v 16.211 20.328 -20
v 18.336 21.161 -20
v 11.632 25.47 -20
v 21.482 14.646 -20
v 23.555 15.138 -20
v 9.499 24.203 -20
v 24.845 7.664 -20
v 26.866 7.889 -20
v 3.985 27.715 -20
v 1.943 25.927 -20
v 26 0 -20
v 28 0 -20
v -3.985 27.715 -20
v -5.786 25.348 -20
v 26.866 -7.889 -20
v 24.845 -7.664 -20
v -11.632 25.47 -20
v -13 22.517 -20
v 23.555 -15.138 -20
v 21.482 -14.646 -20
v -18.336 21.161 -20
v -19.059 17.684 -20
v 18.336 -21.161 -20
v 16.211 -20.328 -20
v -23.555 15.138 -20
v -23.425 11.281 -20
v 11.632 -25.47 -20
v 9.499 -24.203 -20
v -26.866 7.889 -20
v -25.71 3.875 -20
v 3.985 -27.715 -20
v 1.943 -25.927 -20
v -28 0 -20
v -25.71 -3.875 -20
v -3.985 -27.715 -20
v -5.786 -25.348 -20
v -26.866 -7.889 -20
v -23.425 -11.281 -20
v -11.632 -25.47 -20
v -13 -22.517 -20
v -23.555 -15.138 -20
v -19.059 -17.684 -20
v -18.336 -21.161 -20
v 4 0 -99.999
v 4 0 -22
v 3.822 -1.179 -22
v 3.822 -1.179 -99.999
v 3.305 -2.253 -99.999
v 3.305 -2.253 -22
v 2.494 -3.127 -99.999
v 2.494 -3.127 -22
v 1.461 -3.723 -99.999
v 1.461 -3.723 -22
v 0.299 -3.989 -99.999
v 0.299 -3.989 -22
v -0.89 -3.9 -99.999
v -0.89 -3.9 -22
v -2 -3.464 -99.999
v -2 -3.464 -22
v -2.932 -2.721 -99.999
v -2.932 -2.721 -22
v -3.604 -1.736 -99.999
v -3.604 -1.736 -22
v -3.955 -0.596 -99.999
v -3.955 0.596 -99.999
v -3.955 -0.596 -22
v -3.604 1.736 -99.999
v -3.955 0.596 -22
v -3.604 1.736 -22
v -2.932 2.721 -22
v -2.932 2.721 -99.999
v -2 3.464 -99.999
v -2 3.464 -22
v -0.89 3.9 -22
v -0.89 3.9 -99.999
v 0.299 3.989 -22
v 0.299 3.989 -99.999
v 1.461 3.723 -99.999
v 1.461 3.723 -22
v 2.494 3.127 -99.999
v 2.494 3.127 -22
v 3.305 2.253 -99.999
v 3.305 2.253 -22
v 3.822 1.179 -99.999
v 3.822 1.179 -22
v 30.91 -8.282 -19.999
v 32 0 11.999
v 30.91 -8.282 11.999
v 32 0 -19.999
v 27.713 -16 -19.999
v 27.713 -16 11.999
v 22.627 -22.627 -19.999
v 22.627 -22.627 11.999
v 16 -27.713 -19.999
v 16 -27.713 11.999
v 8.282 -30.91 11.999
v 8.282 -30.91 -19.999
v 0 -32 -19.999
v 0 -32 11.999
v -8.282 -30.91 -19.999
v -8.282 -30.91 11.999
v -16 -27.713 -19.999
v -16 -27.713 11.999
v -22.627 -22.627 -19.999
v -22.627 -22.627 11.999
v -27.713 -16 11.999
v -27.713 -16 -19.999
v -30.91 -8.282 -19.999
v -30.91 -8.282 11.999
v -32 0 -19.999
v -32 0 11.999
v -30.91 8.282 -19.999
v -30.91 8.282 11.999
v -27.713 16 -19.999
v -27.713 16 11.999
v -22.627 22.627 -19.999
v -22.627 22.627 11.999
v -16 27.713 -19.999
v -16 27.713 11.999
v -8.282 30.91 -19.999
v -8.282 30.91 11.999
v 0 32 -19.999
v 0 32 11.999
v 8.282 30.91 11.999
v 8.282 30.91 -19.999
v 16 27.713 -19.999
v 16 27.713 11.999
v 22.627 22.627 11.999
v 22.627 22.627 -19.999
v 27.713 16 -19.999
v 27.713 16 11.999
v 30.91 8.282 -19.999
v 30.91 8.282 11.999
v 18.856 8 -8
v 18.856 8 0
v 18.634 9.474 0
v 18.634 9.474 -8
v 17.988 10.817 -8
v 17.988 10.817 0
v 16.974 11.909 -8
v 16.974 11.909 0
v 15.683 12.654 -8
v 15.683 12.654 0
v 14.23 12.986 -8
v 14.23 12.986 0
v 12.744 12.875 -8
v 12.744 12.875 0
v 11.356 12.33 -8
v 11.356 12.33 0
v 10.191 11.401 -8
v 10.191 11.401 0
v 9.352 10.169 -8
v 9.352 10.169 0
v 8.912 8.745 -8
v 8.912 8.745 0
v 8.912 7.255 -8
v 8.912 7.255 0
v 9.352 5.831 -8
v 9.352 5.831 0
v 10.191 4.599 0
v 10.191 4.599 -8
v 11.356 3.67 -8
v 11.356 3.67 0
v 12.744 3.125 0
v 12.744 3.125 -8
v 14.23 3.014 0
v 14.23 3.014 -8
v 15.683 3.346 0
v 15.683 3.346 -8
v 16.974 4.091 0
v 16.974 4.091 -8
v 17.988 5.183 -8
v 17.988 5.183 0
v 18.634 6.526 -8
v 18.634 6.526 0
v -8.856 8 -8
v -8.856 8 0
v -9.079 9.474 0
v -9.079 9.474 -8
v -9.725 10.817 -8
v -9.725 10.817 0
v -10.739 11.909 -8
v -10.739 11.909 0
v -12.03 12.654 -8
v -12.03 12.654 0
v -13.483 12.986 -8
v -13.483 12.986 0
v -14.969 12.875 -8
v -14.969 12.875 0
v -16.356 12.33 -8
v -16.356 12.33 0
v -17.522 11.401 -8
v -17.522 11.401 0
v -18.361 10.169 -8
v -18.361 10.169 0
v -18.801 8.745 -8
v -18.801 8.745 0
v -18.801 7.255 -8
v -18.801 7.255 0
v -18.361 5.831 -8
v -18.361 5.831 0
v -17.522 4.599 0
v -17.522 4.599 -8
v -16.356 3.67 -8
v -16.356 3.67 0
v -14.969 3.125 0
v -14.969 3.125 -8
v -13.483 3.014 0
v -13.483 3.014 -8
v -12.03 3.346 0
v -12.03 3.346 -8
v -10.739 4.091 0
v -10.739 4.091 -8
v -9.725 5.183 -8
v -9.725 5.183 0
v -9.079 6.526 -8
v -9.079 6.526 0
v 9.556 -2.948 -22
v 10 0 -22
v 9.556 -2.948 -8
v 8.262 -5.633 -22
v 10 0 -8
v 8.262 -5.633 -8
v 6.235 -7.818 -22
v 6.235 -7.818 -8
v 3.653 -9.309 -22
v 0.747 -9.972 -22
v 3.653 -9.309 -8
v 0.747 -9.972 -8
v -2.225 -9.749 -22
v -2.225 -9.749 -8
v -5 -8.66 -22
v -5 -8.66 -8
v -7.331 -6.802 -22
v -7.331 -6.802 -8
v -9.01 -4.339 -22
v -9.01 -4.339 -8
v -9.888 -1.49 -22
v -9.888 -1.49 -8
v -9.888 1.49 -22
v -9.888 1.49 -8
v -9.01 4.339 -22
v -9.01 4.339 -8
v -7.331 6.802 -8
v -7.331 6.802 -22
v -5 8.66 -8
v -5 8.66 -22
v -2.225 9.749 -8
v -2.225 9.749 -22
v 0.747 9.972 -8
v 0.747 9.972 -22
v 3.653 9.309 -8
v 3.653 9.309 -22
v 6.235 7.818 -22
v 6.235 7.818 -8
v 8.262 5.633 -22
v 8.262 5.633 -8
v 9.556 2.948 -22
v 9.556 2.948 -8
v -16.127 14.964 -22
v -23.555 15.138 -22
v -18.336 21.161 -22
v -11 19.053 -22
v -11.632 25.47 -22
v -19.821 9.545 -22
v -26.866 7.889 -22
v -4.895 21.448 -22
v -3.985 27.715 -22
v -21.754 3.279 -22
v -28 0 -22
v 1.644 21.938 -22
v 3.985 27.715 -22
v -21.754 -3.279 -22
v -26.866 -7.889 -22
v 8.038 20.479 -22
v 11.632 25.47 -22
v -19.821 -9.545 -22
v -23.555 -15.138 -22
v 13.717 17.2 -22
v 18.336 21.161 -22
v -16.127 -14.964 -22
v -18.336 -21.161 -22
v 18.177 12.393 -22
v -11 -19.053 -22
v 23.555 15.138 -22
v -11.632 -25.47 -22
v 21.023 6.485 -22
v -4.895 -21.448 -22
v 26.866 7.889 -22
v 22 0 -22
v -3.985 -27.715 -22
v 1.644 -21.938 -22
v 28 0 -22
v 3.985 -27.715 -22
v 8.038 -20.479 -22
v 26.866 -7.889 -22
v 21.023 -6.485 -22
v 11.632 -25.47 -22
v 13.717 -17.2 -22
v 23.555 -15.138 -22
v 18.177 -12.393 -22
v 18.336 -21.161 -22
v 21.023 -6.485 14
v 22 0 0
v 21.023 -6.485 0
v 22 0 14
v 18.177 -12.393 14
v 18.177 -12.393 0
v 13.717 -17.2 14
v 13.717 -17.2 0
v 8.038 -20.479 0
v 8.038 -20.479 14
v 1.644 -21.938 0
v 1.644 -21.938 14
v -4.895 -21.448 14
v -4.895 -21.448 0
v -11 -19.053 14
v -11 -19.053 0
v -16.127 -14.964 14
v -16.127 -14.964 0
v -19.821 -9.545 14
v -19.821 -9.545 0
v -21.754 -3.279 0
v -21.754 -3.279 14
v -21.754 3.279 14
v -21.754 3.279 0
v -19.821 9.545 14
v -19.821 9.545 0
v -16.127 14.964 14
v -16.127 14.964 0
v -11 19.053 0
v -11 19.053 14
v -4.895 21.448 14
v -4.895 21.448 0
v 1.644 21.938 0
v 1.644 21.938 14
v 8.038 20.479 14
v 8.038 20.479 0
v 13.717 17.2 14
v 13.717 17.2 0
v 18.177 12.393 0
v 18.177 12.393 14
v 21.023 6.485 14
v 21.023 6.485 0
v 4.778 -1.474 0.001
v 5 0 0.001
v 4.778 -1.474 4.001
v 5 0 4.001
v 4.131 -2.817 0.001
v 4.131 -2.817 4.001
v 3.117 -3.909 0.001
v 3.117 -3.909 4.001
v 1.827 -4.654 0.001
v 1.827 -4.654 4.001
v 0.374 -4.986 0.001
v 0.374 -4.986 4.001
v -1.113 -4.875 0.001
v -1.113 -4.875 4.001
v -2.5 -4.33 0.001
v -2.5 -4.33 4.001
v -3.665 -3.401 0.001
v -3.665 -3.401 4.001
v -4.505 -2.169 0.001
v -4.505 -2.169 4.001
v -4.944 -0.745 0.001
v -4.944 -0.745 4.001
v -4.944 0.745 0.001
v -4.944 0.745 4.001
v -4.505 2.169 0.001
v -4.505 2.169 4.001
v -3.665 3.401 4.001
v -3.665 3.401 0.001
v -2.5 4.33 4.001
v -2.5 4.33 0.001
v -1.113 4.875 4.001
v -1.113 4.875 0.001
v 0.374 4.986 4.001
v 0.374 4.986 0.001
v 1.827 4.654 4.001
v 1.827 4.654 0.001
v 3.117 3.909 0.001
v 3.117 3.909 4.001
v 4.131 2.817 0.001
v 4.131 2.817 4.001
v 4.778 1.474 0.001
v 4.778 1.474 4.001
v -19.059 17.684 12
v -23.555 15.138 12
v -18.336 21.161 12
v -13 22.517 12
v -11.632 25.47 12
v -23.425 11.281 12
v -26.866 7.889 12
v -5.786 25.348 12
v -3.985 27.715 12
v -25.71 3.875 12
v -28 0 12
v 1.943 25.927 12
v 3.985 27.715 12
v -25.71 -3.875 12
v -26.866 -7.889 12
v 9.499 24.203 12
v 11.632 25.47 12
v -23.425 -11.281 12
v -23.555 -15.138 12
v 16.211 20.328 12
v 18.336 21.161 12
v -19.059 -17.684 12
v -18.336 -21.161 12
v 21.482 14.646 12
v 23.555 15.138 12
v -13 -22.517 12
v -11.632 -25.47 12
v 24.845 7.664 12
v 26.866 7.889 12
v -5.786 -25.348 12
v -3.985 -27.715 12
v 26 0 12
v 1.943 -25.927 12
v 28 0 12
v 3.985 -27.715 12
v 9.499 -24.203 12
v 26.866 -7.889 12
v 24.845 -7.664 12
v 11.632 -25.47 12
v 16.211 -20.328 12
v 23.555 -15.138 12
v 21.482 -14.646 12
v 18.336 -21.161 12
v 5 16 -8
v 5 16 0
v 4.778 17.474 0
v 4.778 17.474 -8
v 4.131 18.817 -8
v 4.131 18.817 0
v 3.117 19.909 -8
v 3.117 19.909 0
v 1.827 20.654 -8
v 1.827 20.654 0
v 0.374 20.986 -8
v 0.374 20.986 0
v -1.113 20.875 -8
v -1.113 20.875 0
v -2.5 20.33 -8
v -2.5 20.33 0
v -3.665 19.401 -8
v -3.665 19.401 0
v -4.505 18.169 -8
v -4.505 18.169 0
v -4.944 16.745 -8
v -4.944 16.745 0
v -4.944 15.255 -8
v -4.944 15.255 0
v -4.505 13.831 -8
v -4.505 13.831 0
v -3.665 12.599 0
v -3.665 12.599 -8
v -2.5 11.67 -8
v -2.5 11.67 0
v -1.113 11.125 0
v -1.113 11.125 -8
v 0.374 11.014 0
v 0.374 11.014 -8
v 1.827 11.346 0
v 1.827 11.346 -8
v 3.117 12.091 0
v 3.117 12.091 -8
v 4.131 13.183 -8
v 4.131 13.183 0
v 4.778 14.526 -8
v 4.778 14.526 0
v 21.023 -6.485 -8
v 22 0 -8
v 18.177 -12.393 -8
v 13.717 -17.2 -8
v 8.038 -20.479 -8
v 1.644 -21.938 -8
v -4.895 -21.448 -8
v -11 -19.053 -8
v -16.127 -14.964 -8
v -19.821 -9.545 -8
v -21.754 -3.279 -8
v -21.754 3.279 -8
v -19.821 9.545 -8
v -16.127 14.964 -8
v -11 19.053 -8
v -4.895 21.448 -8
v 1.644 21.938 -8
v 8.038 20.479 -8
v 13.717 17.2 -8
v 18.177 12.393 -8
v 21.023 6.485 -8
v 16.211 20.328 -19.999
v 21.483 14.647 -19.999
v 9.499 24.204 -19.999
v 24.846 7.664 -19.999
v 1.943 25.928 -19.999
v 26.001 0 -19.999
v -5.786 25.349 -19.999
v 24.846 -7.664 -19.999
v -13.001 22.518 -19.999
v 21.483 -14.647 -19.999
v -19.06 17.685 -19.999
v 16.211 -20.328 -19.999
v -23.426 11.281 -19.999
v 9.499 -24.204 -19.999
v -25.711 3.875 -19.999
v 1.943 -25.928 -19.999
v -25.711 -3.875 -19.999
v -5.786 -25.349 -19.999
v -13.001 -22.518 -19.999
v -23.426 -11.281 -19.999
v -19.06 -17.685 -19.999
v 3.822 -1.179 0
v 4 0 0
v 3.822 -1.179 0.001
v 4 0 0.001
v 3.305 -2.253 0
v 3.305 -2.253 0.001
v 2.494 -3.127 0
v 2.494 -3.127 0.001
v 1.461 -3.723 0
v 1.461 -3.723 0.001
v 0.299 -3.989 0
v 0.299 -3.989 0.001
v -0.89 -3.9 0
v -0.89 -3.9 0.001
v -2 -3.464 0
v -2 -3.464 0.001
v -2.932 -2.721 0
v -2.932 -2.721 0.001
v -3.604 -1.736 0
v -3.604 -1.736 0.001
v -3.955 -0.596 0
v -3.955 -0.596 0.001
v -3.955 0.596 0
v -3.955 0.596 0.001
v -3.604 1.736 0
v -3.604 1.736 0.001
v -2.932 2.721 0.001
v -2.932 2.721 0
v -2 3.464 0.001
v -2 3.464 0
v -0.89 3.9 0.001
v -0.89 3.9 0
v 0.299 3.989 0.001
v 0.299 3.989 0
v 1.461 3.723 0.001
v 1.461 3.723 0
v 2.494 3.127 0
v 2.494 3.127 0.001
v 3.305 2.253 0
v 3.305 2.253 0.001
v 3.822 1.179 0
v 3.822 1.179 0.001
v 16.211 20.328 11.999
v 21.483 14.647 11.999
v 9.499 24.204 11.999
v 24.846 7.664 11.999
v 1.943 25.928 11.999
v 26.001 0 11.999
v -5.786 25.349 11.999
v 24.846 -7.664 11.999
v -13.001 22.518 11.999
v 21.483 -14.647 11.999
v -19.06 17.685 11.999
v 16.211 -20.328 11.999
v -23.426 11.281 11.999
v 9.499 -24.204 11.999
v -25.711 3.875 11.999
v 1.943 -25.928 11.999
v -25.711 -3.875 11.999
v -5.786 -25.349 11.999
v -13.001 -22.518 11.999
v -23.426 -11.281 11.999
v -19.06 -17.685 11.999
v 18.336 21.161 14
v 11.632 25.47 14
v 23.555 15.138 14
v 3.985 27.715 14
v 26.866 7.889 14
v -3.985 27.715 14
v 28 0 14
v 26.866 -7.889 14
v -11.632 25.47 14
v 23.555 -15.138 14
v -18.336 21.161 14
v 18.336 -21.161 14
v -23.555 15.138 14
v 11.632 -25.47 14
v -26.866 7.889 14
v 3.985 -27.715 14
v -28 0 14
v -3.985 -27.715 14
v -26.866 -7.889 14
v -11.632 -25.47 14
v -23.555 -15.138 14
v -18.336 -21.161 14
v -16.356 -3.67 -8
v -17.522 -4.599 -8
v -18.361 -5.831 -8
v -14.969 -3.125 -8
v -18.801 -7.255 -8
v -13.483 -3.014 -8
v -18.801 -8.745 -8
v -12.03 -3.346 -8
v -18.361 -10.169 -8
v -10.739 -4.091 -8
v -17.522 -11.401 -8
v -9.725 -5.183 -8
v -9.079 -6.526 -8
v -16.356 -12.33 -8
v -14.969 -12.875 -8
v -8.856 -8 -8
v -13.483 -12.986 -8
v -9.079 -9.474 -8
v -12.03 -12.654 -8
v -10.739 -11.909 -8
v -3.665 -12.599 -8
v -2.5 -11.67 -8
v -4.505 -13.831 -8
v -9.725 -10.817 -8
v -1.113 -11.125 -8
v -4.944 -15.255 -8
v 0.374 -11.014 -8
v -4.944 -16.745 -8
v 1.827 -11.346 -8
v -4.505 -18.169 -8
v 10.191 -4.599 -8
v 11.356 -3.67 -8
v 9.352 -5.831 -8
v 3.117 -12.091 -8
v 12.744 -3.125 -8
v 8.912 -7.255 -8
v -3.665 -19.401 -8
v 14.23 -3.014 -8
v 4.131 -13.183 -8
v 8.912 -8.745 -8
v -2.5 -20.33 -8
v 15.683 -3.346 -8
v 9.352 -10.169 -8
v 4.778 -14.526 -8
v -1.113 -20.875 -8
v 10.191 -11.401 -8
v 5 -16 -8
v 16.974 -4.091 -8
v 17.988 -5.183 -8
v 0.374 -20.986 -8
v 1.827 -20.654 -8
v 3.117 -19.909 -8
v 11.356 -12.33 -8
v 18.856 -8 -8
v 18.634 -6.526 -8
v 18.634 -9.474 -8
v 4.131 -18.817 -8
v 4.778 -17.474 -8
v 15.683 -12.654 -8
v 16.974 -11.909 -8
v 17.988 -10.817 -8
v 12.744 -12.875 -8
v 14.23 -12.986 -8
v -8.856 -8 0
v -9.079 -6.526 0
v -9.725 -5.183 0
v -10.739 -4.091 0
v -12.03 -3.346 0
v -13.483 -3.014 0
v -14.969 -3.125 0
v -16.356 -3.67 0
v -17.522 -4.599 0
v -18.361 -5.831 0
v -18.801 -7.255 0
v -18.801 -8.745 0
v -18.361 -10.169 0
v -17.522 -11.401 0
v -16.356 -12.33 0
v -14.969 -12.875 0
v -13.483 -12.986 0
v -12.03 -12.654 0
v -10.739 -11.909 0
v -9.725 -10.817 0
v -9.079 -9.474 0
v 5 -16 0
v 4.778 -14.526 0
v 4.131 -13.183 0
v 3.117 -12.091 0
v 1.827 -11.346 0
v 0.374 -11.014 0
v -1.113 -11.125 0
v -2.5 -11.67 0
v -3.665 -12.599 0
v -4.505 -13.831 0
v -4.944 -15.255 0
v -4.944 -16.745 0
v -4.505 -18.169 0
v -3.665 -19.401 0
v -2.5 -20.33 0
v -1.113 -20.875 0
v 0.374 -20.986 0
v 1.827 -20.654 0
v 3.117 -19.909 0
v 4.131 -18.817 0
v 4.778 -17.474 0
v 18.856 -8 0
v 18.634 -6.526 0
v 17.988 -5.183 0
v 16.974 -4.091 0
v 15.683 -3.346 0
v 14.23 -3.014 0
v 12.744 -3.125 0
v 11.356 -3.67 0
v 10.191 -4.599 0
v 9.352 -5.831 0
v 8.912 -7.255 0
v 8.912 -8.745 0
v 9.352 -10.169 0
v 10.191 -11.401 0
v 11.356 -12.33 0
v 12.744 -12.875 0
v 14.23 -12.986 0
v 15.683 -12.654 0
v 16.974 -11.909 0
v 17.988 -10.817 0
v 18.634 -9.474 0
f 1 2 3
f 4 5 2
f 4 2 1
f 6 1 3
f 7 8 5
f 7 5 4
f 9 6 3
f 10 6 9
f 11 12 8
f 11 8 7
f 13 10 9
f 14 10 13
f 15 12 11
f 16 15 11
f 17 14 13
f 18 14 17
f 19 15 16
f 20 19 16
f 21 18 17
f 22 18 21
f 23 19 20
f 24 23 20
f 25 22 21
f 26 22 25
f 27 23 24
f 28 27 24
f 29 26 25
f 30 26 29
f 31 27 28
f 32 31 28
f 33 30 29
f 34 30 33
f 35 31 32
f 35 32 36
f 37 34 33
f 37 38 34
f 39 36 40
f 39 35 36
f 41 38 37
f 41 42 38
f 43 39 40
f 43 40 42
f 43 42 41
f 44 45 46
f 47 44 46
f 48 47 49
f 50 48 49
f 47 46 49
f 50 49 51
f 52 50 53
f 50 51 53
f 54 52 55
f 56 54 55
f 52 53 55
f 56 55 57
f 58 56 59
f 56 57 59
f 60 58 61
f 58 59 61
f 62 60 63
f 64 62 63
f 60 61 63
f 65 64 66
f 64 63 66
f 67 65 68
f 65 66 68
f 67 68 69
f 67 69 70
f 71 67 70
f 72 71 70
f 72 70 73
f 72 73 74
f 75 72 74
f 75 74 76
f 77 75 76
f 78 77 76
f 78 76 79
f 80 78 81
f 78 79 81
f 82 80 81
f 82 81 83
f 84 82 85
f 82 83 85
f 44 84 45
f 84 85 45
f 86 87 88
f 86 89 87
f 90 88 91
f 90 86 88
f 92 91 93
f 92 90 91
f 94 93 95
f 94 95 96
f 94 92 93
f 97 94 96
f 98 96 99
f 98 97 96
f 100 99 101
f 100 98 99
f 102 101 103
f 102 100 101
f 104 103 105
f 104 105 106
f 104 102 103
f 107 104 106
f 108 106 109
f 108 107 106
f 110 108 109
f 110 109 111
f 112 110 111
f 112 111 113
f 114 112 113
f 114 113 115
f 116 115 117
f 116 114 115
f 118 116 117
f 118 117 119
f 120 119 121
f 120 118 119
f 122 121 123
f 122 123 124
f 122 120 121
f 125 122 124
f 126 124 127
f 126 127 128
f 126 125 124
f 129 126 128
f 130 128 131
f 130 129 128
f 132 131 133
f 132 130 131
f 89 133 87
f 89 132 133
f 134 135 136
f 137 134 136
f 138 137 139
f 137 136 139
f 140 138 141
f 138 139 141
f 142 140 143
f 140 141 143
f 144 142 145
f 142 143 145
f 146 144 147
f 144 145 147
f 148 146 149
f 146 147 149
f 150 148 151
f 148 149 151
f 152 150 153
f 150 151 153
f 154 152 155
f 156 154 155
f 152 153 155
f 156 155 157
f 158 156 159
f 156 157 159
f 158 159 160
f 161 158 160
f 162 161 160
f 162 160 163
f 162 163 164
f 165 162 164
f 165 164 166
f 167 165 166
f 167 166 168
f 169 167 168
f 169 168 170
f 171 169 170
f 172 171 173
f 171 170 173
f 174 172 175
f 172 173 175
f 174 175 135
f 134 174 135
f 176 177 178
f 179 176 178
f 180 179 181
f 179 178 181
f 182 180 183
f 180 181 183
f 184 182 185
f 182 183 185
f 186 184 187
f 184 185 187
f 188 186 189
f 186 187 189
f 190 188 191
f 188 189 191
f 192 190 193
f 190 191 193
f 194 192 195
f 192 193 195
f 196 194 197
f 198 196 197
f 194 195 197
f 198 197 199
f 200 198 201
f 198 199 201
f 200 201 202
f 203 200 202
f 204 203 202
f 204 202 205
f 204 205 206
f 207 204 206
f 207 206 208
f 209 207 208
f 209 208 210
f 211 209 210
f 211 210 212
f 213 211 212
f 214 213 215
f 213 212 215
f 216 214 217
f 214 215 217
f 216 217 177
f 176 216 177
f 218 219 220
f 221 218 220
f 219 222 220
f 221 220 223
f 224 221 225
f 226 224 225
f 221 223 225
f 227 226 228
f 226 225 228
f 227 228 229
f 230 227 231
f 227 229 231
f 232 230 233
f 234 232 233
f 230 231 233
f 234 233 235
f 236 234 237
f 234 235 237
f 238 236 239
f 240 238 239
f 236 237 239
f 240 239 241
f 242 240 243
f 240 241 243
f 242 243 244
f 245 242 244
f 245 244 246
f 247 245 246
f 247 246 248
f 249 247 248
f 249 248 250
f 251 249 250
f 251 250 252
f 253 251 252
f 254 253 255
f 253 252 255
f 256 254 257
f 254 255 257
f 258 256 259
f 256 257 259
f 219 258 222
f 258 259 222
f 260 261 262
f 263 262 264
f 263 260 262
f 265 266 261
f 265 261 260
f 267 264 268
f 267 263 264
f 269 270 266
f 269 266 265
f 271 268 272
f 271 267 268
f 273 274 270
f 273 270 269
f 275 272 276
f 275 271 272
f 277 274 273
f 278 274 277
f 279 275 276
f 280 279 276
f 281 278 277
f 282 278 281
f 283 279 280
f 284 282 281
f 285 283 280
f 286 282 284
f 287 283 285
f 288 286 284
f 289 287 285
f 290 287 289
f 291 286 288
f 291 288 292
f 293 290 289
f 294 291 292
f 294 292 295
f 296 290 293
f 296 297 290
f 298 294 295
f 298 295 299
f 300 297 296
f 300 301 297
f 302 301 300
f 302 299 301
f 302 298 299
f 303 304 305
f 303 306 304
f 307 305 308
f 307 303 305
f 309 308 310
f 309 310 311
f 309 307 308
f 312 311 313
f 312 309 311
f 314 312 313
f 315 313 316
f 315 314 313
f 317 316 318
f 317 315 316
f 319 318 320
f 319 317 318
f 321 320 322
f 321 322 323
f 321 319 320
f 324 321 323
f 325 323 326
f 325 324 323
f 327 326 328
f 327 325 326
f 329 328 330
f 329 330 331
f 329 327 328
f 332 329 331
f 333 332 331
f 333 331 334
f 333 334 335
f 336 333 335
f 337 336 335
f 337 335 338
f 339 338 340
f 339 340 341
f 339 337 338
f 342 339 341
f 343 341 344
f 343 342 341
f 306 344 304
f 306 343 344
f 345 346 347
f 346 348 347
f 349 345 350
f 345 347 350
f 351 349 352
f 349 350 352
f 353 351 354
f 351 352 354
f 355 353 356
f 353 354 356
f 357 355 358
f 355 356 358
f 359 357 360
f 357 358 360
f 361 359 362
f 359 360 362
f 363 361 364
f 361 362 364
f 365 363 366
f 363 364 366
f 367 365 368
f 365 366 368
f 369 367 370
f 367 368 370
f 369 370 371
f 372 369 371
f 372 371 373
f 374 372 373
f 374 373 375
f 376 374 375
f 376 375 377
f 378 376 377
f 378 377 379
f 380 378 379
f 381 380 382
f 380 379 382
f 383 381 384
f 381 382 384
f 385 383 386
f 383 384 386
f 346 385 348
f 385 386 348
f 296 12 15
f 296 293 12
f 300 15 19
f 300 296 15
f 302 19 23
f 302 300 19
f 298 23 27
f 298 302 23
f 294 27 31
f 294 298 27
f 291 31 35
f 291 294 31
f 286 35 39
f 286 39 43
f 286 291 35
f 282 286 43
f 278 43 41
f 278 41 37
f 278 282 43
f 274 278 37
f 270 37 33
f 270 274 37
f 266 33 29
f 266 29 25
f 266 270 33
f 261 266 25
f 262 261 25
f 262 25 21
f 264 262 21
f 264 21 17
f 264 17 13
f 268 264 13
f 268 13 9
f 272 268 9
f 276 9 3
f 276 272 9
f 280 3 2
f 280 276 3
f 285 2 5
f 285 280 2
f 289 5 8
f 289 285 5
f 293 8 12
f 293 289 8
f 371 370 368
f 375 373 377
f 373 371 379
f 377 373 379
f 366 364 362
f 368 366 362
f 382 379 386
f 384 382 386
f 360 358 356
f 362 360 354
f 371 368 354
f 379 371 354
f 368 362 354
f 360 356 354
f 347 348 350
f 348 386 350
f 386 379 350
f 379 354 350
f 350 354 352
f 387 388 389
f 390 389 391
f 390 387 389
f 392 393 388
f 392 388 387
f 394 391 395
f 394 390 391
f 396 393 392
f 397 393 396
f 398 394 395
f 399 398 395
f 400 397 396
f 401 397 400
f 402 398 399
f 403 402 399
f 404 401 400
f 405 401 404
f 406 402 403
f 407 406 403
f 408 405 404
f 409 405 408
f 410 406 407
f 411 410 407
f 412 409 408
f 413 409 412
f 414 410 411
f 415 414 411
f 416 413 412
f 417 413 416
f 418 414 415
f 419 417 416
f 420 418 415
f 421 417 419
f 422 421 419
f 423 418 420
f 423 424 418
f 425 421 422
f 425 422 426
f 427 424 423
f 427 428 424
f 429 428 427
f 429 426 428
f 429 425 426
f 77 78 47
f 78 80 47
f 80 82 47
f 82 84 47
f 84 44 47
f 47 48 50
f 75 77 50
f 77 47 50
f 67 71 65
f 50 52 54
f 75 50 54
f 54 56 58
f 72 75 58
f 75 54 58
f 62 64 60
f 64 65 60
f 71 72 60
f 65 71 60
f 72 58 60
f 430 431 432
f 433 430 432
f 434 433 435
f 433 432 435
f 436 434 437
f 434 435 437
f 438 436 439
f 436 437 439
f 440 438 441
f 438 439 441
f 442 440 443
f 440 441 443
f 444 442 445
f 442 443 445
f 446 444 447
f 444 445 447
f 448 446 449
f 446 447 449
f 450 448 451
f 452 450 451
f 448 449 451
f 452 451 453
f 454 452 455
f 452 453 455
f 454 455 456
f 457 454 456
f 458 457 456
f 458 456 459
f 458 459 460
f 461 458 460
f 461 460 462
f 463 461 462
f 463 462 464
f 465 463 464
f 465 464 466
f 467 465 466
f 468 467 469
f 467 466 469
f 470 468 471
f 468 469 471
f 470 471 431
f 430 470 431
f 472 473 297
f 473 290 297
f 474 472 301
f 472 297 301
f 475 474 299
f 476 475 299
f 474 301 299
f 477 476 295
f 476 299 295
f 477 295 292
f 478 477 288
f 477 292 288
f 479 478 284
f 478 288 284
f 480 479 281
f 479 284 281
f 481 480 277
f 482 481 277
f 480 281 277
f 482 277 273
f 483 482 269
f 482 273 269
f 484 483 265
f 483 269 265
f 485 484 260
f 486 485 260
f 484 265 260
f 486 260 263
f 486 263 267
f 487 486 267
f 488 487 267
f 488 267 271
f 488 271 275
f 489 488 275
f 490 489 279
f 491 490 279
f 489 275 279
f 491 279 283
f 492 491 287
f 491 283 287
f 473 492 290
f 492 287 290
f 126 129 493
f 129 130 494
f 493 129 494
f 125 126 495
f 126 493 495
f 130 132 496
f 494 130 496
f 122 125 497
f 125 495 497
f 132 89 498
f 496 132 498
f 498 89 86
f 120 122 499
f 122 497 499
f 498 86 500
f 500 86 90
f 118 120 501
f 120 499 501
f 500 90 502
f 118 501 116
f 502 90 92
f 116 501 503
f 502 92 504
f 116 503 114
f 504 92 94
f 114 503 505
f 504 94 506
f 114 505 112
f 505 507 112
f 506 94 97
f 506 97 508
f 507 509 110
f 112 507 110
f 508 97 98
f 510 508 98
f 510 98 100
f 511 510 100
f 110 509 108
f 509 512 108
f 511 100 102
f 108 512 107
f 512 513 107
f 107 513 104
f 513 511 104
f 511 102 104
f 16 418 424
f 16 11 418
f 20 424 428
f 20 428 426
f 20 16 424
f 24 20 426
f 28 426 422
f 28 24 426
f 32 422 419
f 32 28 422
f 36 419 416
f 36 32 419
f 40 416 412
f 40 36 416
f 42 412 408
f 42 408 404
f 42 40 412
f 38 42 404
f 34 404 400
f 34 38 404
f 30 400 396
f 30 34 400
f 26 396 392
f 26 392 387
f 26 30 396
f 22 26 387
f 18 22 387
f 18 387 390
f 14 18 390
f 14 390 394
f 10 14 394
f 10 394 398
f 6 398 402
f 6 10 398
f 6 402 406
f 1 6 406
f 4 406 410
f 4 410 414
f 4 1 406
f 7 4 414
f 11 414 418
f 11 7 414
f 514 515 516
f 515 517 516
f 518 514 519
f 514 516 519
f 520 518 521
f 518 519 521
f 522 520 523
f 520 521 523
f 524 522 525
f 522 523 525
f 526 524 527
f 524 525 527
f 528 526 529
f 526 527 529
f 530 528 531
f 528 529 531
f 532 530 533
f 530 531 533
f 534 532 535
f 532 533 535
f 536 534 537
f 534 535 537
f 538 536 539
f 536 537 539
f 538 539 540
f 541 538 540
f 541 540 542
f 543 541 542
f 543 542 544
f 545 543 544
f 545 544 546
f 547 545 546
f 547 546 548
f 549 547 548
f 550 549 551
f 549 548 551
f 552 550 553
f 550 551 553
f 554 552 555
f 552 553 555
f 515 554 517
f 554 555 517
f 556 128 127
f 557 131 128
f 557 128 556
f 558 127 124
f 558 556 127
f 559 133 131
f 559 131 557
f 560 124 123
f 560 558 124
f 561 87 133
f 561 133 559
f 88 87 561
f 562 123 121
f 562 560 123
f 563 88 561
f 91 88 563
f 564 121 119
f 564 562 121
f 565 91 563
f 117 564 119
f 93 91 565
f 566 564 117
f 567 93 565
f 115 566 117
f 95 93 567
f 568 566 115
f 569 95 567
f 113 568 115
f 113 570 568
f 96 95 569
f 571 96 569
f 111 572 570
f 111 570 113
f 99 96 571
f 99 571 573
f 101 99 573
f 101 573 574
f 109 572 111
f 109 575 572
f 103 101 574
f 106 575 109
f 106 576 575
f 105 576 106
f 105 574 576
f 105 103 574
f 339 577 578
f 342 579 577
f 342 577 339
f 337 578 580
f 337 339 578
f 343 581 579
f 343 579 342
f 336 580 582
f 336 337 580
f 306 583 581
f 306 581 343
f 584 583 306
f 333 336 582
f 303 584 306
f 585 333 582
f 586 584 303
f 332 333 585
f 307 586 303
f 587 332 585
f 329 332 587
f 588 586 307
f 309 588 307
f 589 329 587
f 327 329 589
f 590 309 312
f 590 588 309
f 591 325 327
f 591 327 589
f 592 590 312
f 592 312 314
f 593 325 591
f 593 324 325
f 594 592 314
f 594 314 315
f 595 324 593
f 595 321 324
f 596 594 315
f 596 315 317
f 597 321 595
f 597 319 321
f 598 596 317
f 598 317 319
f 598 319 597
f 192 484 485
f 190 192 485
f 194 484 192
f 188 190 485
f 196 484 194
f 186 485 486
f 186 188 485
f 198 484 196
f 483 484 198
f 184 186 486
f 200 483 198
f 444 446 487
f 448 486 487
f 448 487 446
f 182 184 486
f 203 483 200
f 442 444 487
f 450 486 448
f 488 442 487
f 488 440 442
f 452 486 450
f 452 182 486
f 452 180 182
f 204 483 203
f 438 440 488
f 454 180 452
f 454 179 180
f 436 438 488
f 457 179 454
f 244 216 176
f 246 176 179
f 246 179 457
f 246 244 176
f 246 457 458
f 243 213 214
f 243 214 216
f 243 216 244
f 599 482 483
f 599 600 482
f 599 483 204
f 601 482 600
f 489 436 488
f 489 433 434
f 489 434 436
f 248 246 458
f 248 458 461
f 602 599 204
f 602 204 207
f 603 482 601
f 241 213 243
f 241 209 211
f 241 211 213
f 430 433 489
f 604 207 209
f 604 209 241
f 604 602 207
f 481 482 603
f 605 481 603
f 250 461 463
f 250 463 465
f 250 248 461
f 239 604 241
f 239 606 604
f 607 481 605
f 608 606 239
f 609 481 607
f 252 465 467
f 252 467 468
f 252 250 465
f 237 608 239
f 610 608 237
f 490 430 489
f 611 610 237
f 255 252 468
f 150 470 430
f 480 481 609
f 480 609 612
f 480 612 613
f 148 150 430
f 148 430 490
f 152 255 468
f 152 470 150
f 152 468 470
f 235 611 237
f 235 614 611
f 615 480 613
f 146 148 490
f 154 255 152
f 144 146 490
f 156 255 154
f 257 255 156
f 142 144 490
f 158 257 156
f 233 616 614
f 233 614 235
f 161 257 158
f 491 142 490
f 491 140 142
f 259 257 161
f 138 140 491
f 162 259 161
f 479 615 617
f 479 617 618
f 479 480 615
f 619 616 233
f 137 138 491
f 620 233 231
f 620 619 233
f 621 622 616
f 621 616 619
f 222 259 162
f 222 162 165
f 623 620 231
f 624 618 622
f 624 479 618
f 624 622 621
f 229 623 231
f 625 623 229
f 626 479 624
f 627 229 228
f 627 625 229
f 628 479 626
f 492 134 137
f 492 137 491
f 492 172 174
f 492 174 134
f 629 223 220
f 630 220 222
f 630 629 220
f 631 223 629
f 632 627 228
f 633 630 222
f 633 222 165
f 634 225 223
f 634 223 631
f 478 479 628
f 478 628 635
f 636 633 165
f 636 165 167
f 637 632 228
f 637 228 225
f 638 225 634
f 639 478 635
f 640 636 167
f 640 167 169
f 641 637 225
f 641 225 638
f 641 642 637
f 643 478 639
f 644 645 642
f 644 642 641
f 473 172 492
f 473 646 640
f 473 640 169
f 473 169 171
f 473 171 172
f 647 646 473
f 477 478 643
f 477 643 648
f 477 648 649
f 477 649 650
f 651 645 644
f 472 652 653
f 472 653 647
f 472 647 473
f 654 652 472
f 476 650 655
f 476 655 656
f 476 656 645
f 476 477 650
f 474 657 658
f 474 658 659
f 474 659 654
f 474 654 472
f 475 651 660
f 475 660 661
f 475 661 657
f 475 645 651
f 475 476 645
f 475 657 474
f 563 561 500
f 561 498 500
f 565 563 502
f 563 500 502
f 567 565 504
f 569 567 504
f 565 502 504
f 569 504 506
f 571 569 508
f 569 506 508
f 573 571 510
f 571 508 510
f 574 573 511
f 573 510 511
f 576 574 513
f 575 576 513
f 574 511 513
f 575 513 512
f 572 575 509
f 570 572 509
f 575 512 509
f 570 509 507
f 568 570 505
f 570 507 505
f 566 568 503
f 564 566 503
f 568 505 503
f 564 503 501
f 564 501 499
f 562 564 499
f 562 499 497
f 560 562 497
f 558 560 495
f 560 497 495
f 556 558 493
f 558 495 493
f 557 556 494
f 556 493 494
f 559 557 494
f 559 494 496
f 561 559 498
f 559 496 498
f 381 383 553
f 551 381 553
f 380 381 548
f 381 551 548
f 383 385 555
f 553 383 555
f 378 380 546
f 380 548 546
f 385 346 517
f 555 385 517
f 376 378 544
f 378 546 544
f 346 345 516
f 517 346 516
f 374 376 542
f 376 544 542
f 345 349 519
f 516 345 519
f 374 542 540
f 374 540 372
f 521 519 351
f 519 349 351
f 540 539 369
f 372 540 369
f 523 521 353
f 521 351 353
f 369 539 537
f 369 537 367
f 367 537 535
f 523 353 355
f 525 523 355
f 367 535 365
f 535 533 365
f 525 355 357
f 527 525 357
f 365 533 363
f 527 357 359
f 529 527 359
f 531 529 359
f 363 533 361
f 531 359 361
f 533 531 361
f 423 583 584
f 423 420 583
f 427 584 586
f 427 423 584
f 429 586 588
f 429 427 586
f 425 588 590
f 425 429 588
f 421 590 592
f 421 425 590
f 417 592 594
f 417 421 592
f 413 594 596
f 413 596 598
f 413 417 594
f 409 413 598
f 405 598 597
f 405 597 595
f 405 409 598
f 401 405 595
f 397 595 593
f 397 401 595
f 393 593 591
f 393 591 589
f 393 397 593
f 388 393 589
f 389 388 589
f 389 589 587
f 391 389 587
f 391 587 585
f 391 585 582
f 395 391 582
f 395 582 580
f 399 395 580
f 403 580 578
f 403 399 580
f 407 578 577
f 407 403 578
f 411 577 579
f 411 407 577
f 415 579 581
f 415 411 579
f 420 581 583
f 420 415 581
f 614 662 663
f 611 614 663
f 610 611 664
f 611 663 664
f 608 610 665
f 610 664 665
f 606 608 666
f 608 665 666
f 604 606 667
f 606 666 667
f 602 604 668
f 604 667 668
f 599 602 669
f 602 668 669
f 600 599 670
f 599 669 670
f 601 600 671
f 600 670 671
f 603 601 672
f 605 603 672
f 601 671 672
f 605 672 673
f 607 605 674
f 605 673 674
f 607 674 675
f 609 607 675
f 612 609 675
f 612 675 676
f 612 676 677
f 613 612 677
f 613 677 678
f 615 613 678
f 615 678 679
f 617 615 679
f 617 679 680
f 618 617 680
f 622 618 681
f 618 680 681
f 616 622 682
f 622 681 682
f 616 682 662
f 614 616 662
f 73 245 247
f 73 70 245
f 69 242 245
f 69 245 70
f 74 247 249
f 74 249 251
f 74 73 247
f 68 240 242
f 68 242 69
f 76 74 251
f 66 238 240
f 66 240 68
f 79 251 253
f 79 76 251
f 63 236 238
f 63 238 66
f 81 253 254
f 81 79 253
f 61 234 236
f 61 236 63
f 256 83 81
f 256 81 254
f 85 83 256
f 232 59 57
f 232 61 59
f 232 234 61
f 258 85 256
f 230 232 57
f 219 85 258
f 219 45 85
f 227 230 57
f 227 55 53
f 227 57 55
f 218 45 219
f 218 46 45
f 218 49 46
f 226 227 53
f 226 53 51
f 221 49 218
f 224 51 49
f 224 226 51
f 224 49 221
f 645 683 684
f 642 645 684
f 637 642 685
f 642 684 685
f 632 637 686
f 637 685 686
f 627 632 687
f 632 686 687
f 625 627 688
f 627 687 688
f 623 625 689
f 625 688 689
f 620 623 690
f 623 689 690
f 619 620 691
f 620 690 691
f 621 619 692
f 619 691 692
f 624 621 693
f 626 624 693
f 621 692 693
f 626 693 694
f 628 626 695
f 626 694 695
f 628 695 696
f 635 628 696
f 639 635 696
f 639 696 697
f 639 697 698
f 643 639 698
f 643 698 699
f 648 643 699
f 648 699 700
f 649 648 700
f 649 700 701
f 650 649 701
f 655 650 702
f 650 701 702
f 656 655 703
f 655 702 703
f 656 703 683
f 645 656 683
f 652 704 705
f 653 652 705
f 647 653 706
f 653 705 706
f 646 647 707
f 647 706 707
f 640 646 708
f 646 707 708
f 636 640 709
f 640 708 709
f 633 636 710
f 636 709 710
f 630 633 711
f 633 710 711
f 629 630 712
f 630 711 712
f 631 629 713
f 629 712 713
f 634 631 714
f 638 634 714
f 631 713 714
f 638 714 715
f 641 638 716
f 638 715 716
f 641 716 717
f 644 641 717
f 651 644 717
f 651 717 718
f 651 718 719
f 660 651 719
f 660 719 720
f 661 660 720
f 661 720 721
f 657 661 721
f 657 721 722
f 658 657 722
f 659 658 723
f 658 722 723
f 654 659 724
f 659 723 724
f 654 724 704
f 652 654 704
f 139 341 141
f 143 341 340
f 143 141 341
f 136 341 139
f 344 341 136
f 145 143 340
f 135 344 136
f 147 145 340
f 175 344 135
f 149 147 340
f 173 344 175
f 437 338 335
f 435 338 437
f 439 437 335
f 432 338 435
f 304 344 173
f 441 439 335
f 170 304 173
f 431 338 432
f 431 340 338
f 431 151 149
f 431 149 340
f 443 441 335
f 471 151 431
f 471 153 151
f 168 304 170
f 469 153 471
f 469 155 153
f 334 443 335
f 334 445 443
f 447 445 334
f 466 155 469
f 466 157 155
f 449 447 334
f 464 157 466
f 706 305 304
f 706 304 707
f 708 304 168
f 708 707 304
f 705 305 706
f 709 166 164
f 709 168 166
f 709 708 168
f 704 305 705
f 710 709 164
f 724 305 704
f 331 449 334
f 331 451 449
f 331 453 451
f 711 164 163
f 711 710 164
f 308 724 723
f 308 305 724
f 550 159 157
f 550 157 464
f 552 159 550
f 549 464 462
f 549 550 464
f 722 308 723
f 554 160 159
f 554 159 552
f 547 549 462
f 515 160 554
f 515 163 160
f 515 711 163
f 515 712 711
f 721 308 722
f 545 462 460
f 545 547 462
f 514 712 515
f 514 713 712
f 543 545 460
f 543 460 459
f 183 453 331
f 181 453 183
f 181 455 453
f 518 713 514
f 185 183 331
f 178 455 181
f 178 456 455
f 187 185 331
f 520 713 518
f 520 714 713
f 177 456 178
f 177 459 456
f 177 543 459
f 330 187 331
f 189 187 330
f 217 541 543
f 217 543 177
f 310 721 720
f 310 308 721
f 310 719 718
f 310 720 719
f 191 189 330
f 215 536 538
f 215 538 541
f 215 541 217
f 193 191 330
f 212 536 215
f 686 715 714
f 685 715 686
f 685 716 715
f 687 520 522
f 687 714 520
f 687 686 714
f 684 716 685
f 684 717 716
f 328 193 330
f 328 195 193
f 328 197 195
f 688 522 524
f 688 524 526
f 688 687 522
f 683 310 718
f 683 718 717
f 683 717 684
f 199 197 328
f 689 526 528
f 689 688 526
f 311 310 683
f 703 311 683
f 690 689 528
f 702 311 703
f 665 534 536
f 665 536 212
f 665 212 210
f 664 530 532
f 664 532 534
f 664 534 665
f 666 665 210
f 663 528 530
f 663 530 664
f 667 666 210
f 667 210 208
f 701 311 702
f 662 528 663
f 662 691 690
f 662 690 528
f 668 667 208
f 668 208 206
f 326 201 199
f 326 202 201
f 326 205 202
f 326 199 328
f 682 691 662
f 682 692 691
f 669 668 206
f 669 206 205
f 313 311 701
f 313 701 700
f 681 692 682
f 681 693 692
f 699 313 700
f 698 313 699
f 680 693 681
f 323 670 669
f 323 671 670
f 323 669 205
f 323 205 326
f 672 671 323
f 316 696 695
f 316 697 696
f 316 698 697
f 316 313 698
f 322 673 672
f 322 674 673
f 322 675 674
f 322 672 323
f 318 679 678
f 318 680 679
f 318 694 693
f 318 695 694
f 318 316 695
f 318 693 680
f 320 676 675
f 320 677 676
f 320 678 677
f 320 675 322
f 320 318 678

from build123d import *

# Parameters (mm, degrees)
SKETCH3_W          = 31.998
SKETCH3_H          = 5.999
SKETCH2_R          = 5
CUT_EXTRUDE1_DEPTH = 8


with BuildPart() as part:
    # Sketch1 → Revolve1 (revolve)
    with BuildSketch(Plane(origin=(0, 0, 0), x_dir=(0, 0, -1), z_dir=(1, 0, 0)), mode=Mode.PRIVATE) as revolve1_sk:
        Polygon((0, 4), (0, 22), (-14, 22), (-14, 28), (-12, 28), (-12, 26), (20, 26), (20, 28), (22, 28), (22, 22), (20, 22), (8, 22), (8, 10), (20, 10), (22, 10), (22, 4), (20, 4), align=None)
    revolve(revolve1_sk.sketch.rotate(Axis((0, 0, 0), (0, 0, -1)), 90), axis=Axis((0, 0, 0), (0, 0, -1)))

    # Sketch2 → Cut-Extrude1 (cut)
    with BuildSketch(Plane.XY):
        with Locations((0, 16)):
            Circle(SKETCH2_R)
        with Locations((13.856406461, 8)):
            Circle(SKETCH2_R)
        with Locations((13.856406461, -8)):
            Circle(SKETCH2_R)
        with Locations((0, -16)):
            Circle(SKETCH2_R)
        with Locations((-13.856406461, -8)):
            Circle(SKETCH2_R)
        with Locations((-13.856406461, 8)):
            Circle(SKETCH2_R)
    extrude(amount=-CUT_EXTRUDE1_DEPTH, mode=Mode.SUBTRACT)

    # Sketch4 → Revolve3 (revolve)
    with BuildSketch(Plane(origin=(0, 0, 0), x_dir=(0, 0, -1), z_dir=(1, 0, 0)), mode=Mode.PRIVATE) as revolve3_sk:
        Polygon((-0.001, 4), (-0.001, 5), (-4.001, 5), (-4.001, 0), (99.999, 0), (99.999, 4), align=None)
    revolve(revolve3_sk.sketch.rotate(Axis((0, 0, 4.001), (0, 0, -1)), 90), axis=Axis((0, 0, 4.001), (0, 0, -1)))


with BuildPart() as body_2:
    # Sketch3 → Revolve2 (revolve)
    with BuildSketch(Plane(origin=(0, 0, 0), x_dir=(0, 0, -1), z_dir=(1, 0, 0)), mode=Mode.PRIVATE) as revolve2_sk:
        with Locations((4, 29.0005)):
            Rectangle(SKETCH3_W, SKETCH3_H)
    revolve(revolve2_sk.sketch.rotate(Axis((0, 0, 0), (0, 0, -1)), 90), axis=Axis((0, 0, 0), (0, 0, -1)))


solid = Compound([part.part, body_2.part])
